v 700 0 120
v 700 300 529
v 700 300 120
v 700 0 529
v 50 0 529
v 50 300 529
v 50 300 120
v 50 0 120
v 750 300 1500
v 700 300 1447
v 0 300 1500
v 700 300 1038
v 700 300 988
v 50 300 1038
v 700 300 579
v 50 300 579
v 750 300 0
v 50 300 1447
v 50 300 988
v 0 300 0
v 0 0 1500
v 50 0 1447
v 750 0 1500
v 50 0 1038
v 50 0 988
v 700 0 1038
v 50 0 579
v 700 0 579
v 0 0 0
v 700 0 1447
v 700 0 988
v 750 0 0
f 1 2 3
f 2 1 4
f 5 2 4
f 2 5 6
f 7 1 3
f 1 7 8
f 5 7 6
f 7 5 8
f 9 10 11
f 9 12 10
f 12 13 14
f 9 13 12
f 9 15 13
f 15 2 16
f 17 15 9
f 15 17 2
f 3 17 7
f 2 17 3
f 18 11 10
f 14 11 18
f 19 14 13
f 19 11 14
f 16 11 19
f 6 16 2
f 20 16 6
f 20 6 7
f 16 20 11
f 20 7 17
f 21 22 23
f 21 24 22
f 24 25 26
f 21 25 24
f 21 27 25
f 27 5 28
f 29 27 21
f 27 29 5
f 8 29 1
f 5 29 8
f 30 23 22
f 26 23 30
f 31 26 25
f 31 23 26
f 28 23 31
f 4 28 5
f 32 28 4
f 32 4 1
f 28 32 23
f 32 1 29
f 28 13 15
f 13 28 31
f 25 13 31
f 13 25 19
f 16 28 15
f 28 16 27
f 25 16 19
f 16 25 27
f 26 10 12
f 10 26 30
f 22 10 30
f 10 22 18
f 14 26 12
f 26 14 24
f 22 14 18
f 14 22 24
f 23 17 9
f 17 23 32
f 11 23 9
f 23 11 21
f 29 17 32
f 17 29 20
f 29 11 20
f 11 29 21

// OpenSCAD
// rack module

rack_shelf_number   = 3;

// overall rack dimensions
rack_length         = 750;
rack_width          = 300;
rack_height         = 1500;

// values required to calculate shelfes
rack_bar_width      = 50;  // side bar/wall width
rack_board_height   = 50;  // height of single inlay boards
rack_floor_space    = 70; // free space below lowest board


// rendering with examples from above
rack(rack_shelf_number,
     rack_length,
     rack_width,
     rack_height,
     rack_bar_width,
     rack_board_height,
     rack_floor_space);


module rack(shelf_number,
            length,
            width,
            height,
            bar_width=50,
            board_height=50,
            floor_space=50){

    shelf_length   = length - 2 * bar_width;
    shelf_height   = (height - floor_space - board_height
                          - shelf_number * board_height)
                          / shelf_number - 1;
    shelf_offset   = shelf_height + board_height;

    difference(){
        // main frame
        cube([length,width,height]);
        
        // cutouts for shelfes
        translate([0,0,floor_space + board_height])
            for(i=[0:1:shelf_number - 1]) {
                echo(i * shelf_offset);
                translate([bar_width,0,i * shelf_offset])
                    cube([shelf_length,width,shelf_height]);
        }
    }
}
